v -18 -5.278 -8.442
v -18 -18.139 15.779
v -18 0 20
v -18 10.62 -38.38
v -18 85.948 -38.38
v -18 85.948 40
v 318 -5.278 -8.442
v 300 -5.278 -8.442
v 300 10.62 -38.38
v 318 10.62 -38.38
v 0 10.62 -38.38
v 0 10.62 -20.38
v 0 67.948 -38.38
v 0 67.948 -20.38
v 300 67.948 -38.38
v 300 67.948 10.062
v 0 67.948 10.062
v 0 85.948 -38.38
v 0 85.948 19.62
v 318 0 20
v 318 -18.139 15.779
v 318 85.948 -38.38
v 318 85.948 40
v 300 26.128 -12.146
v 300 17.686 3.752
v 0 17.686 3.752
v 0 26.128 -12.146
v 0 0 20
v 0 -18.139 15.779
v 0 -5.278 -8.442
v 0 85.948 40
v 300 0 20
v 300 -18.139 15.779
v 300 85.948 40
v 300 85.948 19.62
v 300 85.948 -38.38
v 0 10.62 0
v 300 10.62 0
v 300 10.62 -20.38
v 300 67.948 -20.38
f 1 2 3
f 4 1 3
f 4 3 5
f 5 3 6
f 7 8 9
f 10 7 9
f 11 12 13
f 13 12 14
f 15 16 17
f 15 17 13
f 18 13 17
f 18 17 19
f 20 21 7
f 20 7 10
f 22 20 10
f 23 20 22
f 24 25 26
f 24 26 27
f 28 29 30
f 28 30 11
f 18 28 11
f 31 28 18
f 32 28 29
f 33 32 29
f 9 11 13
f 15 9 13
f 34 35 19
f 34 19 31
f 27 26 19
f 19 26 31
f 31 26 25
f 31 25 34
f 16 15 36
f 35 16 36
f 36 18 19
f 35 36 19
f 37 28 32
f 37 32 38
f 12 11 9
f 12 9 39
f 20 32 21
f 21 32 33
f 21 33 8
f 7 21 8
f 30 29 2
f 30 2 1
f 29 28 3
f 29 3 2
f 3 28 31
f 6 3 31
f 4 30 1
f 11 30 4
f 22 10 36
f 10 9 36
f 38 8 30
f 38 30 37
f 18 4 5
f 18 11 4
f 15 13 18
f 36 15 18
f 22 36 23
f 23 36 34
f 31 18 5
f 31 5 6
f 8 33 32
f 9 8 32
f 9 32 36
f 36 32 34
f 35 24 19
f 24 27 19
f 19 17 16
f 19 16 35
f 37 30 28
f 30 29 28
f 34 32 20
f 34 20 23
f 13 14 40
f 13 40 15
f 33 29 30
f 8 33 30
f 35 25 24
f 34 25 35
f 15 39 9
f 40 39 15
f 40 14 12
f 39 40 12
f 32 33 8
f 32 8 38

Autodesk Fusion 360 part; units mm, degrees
sketch "Sketch1" plane through (0, 0, 0) normal (1, 0, 0) x (0, 1, 0)
  line L0 (0, 20) -> (10.6202, 0)
  line L1 (10.6202, 0) -> (85.9483, 40)
  line L2 (0, 0) -> (85.9483, 0) construction
  line L3 (85.9483, 0) -> (85.9483, 40) construction
  line L4 (0, 0) -> (0, 20) construction
  circle A0 centre (18.9045, 27.0439) radius 20 construction
  circle A1 centre (23.6902, 52.23) radius 40 construction
  circle A2 centre (23.9499, 75.0127) radius 60 construction
  line L5 (10.6202, 0) -> (10.6202, -20.3804) construction
  line L6 (10.6202, -38.3804) -> (85.9483, -38.3804)
  line L7 (85.9483, -38.3804) -> (85.9483, 40)
  line L8 (85.9483, 40) -> (85.9483, 160) construction
  line L9 (17.6858, 3.7519) -> (26.1276, -12.1457)
  line L10 (26.1276, -12.1457) -> (85.9483, 19.6196)
  line L11 (67.9483, 10.0615) -> (67.9483, -38.3804)
  line L12 (67.9483, -20.3804) -> (10.6202, -20.3804)
  line L13 (10.6202, -38.3804) -> (10.6202, -20.3804)
  line L14 (0, 20) -> (-18.139, 15.7791)
  line L15 (-18.139, 15.7791) -> (-5.2775, -8.4418)
  line L16 (-5.2775, -8.4418) -> (10.6202, 0)
  line L17 (-5.2775, -8.4418) -> (10.6202, -38.3804)
  line L18 (10.6202, -20.3804) -> (26.1276, -12.1457) construction
  line L19 (0, 20) -> (85.9483, 40)
  dimension "d2" = 20
  dimension "d3" = 40
  dimension "d4" = 40
  dimension "d5" = 80
  dimension "d6" = 120
  dimension "d9" = 120
  dimension "d11" = 18
  dimension "d13" = 18
  dimension "d14" = 18
  dimension "d17" = 27.969
  dimension "d18" = 8
  dimension "d19" = 18
  dimension "d20" = 62.031
  dimension "d21" = 57.3281
  dimension "d22" = 58
  dimension "d23" = 77.2897
  dimension "d24" = 75.131
  dimension "d25" = 27.4239
extrude "Extrude1" add sketch "Sketch1" along normal blind 300 contours L1 L7 L9 L10 | L6 L11 L12 L13 makes body 1 at (100, 40.44, 15.8346) makes body 2 at (100, 29.7296, -38.3804)
extrude "Extrude2" add sketch "Sketch1" along normal blind 300 separate body contours L0 L14 L15 L16 | L6 L7 L10 L11 makes body 3 at (100, -13.8518, 7.7055) makes body 4 at (100, 85.9483, -19.047)
extrude "Extrude3" add sketch "Sketch1" against normal blind 18 separate body makes body 5
extrude "Extrude4" add sketch "Sketch1" along normal blind 18 from surface at 300 separate body makes body 6
equation "d9 = d6"
equation "th = 18 mm"
equation "d11 = th"
equation "d13 = th"
equation "d14 = th"
equation "d19 = th"
equation "d30 = -th"
equation "d33 = th"
